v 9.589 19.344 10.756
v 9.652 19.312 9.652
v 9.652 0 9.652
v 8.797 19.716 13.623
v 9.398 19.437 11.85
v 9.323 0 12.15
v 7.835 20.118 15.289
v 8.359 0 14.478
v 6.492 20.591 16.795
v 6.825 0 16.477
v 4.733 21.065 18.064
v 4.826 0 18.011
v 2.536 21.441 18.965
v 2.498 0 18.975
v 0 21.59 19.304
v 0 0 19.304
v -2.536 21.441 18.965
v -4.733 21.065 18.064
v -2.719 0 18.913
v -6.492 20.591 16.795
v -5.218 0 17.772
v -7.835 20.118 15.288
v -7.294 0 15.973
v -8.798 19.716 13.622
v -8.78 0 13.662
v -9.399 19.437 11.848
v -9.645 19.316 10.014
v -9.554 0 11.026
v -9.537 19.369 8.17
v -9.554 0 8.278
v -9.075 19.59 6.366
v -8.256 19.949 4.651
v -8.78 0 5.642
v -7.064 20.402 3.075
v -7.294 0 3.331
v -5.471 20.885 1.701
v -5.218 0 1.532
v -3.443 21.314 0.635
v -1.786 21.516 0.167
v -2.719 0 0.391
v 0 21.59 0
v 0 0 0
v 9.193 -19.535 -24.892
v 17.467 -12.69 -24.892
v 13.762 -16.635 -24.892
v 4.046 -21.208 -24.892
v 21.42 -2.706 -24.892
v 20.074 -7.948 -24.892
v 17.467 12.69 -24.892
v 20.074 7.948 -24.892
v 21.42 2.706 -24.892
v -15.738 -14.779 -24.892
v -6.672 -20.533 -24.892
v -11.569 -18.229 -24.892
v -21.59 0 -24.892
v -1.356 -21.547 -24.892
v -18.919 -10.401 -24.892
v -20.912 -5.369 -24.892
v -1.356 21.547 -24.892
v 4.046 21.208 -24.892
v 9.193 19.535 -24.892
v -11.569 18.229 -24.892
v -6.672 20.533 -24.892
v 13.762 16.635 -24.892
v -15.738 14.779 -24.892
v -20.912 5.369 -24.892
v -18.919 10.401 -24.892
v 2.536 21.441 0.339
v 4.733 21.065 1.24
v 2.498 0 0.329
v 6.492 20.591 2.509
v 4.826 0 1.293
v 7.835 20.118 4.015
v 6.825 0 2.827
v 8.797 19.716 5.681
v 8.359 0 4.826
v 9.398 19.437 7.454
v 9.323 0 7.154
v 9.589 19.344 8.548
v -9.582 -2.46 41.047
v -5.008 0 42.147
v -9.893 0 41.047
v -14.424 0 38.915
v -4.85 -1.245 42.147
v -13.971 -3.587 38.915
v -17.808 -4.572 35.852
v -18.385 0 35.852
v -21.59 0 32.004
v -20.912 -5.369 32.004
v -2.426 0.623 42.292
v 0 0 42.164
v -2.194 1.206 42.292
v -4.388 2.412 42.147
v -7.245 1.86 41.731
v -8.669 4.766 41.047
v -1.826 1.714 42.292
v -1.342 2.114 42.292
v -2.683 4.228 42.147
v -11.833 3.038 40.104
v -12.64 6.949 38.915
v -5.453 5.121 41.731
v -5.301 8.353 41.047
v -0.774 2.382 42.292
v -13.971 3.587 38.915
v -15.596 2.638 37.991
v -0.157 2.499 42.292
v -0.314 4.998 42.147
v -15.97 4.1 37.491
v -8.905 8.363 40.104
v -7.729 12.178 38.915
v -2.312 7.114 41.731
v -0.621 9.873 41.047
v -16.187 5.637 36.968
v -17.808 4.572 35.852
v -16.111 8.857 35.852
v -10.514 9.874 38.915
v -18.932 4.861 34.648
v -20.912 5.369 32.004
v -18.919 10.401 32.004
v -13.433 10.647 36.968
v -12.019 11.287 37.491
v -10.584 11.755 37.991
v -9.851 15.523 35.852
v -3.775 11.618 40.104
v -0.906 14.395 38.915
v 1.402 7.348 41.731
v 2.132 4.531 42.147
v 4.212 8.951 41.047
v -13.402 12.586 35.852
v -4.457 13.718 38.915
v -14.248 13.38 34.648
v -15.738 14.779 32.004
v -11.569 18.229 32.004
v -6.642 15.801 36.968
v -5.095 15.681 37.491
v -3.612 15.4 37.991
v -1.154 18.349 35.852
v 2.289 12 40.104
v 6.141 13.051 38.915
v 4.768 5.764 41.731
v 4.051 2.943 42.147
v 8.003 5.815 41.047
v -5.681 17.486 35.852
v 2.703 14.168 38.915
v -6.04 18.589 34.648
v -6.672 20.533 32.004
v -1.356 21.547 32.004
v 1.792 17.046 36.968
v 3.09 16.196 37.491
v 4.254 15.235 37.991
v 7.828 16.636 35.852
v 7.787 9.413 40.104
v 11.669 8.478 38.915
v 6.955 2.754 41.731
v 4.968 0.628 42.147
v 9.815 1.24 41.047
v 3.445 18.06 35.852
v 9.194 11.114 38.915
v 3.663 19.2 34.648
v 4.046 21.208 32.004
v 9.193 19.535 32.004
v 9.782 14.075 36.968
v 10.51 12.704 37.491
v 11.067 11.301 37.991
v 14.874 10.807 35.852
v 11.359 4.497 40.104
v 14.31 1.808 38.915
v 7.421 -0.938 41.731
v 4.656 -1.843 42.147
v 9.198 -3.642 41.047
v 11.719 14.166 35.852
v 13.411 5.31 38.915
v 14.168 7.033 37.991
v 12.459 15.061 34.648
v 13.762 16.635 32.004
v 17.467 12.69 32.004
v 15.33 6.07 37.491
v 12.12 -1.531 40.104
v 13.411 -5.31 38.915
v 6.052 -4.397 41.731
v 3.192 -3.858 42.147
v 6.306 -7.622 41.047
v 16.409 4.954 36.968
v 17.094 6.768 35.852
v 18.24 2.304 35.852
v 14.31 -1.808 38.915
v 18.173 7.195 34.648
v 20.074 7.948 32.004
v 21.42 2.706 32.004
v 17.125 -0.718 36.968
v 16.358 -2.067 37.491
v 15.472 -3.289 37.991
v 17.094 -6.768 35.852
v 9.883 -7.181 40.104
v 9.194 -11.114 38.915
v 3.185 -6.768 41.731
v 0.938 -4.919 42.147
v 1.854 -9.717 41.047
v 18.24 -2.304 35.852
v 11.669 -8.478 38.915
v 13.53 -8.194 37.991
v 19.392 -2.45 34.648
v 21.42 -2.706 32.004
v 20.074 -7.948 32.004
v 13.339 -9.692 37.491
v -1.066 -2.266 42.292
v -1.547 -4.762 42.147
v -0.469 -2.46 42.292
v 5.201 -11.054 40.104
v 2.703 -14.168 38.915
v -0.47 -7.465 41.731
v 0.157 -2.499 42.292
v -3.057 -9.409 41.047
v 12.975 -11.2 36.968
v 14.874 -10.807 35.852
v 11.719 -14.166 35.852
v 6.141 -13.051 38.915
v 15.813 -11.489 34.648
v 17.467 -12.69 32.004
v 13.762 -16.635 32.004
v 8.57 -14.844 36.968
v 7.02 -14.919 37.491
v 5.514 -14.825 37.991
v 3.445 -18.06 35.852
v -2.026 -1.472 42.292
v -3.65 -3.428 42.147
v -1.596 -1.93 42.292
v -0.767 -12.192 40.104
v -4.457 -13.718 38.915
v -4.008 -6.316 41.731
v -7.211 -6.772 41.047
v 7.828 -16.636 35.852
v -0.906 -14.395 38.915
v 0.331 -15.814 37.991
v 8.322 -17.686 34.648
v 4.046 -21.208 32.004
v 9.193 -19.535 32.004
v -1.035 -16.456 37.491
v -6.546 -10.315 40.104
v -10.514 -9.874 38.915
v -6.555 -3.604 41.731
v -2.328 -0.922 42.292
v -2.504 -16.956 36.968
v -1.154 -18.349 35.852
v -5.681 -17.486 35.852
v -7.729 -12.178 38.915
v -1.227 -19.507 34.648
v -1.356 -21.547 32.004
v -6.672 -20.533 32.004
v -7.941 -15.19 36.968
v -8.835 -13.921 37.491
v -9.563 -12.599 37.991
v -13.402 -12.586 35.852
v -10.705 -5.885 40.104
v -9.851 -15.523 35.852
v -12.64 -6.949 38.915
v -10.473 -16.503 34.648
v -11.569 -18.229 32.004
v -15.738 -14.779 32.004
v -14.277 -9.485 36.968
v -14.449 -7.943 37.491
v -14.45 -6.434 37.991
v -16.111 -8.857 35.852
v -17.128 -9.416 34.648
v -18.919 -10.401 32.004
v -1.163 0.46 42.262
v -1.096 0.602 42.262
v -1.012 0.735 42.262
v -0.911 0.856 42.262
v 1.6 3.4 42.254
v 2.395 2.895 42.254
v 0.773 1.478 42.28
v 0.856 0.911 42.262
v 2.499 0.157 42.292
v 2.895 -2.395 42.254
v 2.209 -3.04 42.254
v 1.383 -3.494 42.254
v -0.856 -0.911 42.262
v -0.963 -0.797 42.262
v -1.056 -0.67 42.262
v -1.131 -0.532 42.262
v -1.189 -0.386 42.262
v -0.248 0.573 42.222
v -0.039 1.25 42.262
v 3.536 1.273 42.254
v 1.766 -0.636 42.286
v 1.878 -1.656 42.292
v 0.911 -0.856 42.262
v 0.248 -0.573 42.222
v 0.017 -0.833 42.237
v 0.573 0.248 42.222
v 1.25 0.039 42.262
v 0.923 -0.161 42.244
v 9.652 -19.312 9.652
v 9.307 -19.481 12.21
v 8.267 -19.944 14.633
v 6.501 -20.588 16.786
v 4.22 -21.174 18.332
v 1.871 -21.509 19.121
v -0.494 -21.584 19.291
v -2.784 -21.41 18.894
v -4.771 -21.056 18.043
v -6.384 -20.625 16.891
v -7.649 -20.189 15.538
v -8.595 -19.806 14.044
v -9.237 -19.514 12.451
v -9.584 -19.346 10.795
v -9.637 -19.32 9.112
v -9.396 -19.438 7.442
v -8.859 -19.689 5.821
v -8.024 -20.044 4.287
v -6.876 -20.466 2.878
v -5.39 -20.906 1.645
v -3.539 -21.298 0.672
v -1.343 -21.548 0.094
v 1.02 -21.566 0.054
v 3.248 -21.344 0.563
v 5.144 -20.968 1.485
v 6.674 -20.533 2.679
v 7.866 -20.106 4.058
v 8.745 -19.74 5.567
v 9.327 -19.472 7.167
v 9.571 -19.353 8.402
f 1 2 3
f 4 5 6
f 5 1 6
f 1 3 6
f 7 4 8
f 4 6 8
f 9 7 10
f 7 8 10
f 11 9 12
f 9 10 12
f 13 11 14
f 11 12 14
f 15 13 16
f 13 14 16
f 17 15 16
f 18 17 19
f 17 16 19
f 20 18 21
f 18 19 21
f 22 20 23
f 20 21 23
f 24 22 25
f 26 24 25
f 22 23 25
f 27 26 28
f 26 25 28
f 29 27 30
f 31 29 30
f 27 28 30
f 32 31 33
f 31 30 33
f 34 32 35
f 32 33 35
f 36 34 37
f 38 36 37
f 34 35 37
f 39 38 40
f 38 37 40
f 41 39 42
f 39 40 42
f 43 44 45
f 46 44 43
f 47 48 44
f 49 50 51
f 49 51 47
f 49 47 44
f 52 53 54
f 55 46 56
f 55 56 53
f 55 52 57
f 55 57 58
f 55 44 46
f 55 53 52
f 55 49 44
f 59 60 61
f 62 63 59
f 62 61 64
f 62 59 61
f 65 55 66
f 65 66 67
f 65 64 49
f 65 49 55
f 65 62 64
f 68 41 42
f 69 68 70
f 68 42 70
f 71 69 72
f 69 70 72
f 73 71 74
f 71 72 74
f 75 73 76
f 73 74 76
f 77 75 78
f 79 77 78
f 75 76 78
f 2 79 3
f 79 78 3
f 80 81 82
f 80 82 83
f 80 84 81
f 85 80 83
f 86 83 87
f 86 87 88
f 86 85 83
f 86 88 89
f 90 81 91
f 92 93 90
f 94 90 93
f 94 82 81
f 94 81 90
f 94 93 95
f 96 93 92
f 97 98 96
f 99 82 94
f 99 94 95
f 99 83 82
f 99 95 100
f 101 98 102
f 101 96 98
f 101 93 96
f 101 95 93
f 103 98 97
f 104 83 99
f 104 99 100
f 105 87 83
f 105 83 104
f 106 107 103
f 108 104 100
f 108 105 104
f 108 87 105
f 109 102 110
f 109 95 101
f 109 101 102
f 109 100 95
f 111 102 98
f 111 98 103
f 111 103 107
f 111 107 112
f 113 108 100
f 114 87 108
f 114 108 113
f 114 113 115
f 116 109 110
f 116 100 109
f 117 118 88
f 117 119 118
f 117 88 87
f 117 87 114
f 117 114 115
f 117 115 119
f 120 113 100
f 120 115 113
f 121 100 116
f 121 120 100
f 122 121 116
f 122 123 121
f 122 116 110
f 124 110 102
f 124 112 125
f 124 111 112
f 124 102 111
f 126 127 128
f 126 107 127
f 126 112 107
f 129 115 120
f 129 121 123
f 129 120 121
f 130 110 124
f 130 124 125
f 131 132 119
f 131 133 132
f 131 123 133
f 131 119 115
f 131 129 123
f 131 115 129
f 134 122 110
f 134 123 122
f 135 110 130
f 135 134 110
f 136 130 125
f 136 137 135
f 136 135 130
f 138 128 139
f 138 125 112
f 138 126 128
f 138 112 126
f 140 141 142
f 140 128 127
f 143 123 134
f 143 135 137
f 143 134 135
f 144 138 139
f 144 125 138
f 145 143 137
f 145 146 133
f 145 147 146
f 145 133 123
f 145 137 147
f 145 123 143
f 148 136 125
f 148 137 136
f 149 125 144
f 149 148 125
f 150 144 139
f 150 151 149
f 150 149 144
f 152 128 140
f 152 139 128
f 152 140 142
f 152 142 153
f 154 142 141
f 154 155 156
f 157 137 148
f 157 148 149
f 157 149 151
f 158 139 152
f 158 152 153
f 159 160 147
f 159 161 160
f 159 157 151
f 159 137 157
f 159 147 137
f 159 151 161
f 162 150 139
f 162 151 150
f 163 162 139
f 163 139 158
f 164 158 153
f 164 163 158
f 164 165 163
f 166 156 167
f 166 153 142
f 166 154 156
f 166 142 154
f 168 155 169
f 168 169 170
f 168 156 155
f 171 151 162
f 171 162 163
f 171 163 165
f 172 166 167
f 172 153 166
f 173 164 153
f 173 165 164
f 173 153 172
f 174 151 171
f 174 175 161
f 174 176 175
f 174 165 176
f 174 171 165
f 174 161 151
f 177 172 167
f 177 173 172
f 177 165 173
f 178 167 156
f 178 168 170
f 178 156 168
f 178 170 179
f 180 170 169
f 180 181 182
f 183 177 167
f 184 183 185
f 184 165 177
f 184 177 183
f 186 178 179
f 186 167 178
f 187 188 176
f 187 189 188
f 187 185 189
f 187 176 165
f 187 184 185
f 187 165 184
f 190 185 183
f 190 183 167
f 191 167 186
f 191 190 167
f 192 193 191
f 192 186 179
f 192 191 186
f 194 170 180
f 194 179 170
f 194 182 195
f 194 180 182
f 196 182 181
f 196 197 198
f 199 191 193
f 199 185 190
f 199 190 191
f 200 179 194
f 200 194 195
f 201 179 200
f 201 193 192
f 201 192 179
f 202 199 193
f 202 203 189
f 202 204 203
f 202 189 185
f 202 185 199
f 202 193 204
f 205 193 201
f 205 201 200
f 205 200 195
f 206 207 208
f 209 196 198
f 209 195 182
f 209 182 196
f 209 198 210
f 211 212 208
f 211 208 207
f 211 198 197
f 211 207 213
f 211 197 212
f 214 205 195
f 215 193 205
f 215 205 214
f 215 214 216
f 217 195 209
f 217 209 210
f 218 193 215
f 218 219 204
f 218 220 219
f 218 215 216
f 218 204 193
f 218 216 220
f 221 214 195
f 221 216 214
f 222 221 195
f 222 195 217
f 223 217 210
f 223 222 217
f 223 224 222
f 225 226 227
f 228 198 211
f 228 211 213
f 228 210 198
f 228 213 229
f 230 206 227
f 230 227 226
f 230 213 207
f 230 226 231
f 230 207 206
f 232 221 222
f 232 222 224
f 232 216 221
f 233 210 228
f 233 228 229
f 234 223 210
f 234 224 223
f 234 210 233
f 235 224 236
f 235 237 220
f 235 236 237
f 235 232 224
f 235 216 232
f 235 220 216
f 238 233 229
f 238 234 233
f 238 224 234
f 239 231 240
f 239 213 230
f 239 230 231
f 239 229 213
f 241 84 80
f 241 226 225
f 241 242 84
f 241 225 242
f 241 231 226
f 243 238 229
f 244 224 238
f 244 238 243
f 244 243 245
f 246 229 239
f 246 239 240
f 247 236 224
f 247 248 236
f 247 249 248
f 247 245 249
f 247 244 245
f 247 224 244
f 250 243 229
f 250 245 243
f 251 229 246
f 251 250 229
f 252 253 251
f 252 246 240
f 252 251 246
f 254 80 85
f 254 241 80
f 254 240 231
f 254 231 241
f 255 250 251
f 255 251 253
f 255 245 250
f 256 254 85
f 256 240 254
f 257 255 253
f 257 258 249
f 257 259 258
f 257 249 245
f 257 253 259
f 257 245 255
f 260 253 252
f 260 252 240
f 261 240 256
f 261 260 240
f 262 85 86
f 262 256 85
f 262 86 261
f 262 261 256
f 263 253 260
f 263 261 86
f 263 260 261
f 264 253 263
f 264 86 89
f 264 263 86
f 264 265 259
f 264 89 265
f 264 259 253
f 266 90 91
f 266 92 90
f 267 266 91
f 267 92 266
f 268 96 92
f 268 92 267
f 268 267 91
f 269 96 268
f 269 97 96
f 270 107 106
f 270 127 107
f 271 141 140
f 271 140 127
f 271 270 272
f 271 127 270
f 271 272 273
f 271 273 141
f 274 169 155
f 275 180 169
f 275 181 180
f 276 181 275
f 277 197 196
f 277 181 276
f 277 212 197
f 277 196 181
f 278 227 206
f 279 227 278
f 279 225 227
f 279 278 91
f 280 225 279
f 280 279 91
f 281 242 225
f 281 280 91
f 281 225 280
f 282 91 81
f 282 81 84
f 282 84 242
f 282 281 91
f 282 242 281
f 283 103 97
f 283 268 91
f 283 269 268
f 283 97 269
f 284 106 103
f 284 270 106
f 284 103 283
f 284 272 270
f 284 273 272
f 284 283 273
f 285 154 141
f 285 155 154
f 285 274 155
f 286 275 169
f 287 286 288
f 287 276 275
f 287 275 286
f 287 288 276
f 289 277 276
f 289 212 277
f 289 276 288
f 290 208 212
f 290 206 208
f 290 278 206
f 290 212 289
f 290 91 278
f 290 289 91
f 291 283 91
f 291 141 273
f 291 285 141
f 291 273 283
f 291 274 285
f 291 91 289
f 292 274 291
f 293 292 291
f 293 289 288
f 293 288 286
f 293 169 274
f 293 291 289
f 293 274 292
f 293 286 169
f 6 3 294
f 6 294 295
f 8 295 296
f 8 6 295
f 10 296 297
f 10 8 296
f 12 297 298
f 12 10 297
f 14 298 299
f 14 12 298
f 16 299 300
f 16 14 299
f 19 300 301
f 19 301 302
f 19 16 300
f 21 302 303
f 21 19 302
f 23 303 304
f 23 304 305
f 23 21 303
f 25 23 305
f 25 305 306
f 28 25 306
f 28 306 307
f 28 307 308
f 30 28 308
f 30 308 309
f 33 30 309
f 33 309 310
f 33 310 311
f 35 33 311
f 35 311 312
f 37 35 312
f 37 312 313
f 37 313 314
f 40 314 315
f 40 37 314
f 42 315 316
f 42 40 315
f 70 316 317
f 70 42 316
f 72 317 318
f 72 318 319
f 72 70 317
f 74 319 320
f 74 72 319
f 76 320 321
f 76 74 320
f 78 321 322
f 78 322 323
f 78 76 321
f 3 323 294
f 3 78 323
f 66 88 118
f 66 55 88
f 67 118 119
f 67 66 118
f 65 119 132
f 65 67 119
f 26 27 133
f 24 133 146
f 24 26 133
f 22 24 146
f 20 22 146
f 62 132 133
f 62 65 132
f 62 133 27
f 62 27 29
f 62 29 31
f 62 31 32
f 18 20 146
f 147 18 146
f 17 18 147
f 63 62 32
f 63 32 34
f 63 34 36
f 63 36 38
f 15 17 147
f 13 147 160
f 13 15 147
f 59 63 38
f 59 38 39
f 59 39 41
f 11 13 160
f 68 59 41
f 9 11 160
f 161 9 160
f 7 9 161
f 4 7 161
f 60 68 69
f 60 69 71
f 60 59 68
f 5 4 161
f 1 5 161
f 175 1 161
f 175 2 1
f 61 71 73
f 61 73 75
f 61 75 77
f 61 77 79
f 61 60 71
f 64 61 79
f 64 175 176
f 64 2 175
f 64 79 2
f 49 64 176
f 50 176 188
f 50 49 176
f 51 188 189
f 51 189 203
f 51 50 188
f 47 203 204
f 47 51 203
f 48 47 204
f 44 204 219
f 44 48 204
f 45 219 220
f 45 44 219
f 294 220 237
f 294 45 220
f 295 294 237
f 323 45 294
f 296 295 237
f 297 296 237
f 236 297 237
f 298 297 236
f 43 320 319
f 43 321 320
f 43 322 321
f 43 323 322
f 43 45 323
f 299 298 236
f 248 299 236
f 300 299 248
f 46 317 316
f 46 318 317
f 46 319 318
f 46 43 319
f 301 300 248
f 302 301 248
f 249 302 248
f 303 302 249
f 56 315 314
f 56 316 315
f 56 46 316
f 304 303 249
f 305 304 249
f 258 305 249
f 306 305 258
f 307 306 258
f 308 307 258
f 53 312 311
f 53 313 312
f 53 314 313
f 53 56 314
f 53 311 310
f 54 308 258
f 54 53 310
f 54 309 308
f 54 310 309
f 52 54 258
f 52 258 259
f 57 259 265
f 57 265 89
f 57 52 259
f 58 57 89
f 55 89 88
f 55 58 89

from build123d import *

# Parameters (mm, degrees)
F3_DEPTH = 21.844
F4_R     = 9.652
F5_DEPTH = 21.844


with BuildPart() as f1:
    # F0 (on Front) → F1 (revolve)
    with BuildSketch(Plane.XZ):
        with BuildLine():
            Line((-21.59, -24.892), (0, -24.892))
            Line((0, -24.892), (0, 0))
            Line((0, 0), (0, 42.164))
            ThreePointArc((0, 42.164), (-12.216408, 40.104491), (-21.59, 32.004))
            Line((-21.59, 32.004), (-21.59, 19.304))
            Line((-21.59, 19.304), (-21.59, 0))
            Line((-21.59, 0), (-21.59, -24.892))
        make_face()
    revolve(axis=Axis((0, 0, 8.636), (0, 0, -1)))

    # F2 (on Front) → F3 (cut)
    with BuildSketch(Plane.XZ):
        with BuildLine():
            ThreePointArc((0, 19.304), (-9.652, 9.652), (0, 0))
            Line((0, 0), (0, 19.304))
        make_face()
        with BuildLine():
            Line((0, 19.304), (0, 0))
            ThreePointArc((0, 0), (6.824995, 2.827005), (9.652, 9.652))
            ThreePointArc((9.652, 9.652), (6.824995, 16.476995), (0, 19.304))
        make_face()
    extrude(amount=-F3_DEPTH, mode=Mode.SUBTRACT)

    # F4 (on Front) → F5 (cut)
    with BuildSketch(Plane.XZ):
        with Locations((0, 9.652)):
            Circle(F4_R)
    extrude(amount=F5_DEPTH, mode=Mode.SUBTRACT)


solid = f1.part
